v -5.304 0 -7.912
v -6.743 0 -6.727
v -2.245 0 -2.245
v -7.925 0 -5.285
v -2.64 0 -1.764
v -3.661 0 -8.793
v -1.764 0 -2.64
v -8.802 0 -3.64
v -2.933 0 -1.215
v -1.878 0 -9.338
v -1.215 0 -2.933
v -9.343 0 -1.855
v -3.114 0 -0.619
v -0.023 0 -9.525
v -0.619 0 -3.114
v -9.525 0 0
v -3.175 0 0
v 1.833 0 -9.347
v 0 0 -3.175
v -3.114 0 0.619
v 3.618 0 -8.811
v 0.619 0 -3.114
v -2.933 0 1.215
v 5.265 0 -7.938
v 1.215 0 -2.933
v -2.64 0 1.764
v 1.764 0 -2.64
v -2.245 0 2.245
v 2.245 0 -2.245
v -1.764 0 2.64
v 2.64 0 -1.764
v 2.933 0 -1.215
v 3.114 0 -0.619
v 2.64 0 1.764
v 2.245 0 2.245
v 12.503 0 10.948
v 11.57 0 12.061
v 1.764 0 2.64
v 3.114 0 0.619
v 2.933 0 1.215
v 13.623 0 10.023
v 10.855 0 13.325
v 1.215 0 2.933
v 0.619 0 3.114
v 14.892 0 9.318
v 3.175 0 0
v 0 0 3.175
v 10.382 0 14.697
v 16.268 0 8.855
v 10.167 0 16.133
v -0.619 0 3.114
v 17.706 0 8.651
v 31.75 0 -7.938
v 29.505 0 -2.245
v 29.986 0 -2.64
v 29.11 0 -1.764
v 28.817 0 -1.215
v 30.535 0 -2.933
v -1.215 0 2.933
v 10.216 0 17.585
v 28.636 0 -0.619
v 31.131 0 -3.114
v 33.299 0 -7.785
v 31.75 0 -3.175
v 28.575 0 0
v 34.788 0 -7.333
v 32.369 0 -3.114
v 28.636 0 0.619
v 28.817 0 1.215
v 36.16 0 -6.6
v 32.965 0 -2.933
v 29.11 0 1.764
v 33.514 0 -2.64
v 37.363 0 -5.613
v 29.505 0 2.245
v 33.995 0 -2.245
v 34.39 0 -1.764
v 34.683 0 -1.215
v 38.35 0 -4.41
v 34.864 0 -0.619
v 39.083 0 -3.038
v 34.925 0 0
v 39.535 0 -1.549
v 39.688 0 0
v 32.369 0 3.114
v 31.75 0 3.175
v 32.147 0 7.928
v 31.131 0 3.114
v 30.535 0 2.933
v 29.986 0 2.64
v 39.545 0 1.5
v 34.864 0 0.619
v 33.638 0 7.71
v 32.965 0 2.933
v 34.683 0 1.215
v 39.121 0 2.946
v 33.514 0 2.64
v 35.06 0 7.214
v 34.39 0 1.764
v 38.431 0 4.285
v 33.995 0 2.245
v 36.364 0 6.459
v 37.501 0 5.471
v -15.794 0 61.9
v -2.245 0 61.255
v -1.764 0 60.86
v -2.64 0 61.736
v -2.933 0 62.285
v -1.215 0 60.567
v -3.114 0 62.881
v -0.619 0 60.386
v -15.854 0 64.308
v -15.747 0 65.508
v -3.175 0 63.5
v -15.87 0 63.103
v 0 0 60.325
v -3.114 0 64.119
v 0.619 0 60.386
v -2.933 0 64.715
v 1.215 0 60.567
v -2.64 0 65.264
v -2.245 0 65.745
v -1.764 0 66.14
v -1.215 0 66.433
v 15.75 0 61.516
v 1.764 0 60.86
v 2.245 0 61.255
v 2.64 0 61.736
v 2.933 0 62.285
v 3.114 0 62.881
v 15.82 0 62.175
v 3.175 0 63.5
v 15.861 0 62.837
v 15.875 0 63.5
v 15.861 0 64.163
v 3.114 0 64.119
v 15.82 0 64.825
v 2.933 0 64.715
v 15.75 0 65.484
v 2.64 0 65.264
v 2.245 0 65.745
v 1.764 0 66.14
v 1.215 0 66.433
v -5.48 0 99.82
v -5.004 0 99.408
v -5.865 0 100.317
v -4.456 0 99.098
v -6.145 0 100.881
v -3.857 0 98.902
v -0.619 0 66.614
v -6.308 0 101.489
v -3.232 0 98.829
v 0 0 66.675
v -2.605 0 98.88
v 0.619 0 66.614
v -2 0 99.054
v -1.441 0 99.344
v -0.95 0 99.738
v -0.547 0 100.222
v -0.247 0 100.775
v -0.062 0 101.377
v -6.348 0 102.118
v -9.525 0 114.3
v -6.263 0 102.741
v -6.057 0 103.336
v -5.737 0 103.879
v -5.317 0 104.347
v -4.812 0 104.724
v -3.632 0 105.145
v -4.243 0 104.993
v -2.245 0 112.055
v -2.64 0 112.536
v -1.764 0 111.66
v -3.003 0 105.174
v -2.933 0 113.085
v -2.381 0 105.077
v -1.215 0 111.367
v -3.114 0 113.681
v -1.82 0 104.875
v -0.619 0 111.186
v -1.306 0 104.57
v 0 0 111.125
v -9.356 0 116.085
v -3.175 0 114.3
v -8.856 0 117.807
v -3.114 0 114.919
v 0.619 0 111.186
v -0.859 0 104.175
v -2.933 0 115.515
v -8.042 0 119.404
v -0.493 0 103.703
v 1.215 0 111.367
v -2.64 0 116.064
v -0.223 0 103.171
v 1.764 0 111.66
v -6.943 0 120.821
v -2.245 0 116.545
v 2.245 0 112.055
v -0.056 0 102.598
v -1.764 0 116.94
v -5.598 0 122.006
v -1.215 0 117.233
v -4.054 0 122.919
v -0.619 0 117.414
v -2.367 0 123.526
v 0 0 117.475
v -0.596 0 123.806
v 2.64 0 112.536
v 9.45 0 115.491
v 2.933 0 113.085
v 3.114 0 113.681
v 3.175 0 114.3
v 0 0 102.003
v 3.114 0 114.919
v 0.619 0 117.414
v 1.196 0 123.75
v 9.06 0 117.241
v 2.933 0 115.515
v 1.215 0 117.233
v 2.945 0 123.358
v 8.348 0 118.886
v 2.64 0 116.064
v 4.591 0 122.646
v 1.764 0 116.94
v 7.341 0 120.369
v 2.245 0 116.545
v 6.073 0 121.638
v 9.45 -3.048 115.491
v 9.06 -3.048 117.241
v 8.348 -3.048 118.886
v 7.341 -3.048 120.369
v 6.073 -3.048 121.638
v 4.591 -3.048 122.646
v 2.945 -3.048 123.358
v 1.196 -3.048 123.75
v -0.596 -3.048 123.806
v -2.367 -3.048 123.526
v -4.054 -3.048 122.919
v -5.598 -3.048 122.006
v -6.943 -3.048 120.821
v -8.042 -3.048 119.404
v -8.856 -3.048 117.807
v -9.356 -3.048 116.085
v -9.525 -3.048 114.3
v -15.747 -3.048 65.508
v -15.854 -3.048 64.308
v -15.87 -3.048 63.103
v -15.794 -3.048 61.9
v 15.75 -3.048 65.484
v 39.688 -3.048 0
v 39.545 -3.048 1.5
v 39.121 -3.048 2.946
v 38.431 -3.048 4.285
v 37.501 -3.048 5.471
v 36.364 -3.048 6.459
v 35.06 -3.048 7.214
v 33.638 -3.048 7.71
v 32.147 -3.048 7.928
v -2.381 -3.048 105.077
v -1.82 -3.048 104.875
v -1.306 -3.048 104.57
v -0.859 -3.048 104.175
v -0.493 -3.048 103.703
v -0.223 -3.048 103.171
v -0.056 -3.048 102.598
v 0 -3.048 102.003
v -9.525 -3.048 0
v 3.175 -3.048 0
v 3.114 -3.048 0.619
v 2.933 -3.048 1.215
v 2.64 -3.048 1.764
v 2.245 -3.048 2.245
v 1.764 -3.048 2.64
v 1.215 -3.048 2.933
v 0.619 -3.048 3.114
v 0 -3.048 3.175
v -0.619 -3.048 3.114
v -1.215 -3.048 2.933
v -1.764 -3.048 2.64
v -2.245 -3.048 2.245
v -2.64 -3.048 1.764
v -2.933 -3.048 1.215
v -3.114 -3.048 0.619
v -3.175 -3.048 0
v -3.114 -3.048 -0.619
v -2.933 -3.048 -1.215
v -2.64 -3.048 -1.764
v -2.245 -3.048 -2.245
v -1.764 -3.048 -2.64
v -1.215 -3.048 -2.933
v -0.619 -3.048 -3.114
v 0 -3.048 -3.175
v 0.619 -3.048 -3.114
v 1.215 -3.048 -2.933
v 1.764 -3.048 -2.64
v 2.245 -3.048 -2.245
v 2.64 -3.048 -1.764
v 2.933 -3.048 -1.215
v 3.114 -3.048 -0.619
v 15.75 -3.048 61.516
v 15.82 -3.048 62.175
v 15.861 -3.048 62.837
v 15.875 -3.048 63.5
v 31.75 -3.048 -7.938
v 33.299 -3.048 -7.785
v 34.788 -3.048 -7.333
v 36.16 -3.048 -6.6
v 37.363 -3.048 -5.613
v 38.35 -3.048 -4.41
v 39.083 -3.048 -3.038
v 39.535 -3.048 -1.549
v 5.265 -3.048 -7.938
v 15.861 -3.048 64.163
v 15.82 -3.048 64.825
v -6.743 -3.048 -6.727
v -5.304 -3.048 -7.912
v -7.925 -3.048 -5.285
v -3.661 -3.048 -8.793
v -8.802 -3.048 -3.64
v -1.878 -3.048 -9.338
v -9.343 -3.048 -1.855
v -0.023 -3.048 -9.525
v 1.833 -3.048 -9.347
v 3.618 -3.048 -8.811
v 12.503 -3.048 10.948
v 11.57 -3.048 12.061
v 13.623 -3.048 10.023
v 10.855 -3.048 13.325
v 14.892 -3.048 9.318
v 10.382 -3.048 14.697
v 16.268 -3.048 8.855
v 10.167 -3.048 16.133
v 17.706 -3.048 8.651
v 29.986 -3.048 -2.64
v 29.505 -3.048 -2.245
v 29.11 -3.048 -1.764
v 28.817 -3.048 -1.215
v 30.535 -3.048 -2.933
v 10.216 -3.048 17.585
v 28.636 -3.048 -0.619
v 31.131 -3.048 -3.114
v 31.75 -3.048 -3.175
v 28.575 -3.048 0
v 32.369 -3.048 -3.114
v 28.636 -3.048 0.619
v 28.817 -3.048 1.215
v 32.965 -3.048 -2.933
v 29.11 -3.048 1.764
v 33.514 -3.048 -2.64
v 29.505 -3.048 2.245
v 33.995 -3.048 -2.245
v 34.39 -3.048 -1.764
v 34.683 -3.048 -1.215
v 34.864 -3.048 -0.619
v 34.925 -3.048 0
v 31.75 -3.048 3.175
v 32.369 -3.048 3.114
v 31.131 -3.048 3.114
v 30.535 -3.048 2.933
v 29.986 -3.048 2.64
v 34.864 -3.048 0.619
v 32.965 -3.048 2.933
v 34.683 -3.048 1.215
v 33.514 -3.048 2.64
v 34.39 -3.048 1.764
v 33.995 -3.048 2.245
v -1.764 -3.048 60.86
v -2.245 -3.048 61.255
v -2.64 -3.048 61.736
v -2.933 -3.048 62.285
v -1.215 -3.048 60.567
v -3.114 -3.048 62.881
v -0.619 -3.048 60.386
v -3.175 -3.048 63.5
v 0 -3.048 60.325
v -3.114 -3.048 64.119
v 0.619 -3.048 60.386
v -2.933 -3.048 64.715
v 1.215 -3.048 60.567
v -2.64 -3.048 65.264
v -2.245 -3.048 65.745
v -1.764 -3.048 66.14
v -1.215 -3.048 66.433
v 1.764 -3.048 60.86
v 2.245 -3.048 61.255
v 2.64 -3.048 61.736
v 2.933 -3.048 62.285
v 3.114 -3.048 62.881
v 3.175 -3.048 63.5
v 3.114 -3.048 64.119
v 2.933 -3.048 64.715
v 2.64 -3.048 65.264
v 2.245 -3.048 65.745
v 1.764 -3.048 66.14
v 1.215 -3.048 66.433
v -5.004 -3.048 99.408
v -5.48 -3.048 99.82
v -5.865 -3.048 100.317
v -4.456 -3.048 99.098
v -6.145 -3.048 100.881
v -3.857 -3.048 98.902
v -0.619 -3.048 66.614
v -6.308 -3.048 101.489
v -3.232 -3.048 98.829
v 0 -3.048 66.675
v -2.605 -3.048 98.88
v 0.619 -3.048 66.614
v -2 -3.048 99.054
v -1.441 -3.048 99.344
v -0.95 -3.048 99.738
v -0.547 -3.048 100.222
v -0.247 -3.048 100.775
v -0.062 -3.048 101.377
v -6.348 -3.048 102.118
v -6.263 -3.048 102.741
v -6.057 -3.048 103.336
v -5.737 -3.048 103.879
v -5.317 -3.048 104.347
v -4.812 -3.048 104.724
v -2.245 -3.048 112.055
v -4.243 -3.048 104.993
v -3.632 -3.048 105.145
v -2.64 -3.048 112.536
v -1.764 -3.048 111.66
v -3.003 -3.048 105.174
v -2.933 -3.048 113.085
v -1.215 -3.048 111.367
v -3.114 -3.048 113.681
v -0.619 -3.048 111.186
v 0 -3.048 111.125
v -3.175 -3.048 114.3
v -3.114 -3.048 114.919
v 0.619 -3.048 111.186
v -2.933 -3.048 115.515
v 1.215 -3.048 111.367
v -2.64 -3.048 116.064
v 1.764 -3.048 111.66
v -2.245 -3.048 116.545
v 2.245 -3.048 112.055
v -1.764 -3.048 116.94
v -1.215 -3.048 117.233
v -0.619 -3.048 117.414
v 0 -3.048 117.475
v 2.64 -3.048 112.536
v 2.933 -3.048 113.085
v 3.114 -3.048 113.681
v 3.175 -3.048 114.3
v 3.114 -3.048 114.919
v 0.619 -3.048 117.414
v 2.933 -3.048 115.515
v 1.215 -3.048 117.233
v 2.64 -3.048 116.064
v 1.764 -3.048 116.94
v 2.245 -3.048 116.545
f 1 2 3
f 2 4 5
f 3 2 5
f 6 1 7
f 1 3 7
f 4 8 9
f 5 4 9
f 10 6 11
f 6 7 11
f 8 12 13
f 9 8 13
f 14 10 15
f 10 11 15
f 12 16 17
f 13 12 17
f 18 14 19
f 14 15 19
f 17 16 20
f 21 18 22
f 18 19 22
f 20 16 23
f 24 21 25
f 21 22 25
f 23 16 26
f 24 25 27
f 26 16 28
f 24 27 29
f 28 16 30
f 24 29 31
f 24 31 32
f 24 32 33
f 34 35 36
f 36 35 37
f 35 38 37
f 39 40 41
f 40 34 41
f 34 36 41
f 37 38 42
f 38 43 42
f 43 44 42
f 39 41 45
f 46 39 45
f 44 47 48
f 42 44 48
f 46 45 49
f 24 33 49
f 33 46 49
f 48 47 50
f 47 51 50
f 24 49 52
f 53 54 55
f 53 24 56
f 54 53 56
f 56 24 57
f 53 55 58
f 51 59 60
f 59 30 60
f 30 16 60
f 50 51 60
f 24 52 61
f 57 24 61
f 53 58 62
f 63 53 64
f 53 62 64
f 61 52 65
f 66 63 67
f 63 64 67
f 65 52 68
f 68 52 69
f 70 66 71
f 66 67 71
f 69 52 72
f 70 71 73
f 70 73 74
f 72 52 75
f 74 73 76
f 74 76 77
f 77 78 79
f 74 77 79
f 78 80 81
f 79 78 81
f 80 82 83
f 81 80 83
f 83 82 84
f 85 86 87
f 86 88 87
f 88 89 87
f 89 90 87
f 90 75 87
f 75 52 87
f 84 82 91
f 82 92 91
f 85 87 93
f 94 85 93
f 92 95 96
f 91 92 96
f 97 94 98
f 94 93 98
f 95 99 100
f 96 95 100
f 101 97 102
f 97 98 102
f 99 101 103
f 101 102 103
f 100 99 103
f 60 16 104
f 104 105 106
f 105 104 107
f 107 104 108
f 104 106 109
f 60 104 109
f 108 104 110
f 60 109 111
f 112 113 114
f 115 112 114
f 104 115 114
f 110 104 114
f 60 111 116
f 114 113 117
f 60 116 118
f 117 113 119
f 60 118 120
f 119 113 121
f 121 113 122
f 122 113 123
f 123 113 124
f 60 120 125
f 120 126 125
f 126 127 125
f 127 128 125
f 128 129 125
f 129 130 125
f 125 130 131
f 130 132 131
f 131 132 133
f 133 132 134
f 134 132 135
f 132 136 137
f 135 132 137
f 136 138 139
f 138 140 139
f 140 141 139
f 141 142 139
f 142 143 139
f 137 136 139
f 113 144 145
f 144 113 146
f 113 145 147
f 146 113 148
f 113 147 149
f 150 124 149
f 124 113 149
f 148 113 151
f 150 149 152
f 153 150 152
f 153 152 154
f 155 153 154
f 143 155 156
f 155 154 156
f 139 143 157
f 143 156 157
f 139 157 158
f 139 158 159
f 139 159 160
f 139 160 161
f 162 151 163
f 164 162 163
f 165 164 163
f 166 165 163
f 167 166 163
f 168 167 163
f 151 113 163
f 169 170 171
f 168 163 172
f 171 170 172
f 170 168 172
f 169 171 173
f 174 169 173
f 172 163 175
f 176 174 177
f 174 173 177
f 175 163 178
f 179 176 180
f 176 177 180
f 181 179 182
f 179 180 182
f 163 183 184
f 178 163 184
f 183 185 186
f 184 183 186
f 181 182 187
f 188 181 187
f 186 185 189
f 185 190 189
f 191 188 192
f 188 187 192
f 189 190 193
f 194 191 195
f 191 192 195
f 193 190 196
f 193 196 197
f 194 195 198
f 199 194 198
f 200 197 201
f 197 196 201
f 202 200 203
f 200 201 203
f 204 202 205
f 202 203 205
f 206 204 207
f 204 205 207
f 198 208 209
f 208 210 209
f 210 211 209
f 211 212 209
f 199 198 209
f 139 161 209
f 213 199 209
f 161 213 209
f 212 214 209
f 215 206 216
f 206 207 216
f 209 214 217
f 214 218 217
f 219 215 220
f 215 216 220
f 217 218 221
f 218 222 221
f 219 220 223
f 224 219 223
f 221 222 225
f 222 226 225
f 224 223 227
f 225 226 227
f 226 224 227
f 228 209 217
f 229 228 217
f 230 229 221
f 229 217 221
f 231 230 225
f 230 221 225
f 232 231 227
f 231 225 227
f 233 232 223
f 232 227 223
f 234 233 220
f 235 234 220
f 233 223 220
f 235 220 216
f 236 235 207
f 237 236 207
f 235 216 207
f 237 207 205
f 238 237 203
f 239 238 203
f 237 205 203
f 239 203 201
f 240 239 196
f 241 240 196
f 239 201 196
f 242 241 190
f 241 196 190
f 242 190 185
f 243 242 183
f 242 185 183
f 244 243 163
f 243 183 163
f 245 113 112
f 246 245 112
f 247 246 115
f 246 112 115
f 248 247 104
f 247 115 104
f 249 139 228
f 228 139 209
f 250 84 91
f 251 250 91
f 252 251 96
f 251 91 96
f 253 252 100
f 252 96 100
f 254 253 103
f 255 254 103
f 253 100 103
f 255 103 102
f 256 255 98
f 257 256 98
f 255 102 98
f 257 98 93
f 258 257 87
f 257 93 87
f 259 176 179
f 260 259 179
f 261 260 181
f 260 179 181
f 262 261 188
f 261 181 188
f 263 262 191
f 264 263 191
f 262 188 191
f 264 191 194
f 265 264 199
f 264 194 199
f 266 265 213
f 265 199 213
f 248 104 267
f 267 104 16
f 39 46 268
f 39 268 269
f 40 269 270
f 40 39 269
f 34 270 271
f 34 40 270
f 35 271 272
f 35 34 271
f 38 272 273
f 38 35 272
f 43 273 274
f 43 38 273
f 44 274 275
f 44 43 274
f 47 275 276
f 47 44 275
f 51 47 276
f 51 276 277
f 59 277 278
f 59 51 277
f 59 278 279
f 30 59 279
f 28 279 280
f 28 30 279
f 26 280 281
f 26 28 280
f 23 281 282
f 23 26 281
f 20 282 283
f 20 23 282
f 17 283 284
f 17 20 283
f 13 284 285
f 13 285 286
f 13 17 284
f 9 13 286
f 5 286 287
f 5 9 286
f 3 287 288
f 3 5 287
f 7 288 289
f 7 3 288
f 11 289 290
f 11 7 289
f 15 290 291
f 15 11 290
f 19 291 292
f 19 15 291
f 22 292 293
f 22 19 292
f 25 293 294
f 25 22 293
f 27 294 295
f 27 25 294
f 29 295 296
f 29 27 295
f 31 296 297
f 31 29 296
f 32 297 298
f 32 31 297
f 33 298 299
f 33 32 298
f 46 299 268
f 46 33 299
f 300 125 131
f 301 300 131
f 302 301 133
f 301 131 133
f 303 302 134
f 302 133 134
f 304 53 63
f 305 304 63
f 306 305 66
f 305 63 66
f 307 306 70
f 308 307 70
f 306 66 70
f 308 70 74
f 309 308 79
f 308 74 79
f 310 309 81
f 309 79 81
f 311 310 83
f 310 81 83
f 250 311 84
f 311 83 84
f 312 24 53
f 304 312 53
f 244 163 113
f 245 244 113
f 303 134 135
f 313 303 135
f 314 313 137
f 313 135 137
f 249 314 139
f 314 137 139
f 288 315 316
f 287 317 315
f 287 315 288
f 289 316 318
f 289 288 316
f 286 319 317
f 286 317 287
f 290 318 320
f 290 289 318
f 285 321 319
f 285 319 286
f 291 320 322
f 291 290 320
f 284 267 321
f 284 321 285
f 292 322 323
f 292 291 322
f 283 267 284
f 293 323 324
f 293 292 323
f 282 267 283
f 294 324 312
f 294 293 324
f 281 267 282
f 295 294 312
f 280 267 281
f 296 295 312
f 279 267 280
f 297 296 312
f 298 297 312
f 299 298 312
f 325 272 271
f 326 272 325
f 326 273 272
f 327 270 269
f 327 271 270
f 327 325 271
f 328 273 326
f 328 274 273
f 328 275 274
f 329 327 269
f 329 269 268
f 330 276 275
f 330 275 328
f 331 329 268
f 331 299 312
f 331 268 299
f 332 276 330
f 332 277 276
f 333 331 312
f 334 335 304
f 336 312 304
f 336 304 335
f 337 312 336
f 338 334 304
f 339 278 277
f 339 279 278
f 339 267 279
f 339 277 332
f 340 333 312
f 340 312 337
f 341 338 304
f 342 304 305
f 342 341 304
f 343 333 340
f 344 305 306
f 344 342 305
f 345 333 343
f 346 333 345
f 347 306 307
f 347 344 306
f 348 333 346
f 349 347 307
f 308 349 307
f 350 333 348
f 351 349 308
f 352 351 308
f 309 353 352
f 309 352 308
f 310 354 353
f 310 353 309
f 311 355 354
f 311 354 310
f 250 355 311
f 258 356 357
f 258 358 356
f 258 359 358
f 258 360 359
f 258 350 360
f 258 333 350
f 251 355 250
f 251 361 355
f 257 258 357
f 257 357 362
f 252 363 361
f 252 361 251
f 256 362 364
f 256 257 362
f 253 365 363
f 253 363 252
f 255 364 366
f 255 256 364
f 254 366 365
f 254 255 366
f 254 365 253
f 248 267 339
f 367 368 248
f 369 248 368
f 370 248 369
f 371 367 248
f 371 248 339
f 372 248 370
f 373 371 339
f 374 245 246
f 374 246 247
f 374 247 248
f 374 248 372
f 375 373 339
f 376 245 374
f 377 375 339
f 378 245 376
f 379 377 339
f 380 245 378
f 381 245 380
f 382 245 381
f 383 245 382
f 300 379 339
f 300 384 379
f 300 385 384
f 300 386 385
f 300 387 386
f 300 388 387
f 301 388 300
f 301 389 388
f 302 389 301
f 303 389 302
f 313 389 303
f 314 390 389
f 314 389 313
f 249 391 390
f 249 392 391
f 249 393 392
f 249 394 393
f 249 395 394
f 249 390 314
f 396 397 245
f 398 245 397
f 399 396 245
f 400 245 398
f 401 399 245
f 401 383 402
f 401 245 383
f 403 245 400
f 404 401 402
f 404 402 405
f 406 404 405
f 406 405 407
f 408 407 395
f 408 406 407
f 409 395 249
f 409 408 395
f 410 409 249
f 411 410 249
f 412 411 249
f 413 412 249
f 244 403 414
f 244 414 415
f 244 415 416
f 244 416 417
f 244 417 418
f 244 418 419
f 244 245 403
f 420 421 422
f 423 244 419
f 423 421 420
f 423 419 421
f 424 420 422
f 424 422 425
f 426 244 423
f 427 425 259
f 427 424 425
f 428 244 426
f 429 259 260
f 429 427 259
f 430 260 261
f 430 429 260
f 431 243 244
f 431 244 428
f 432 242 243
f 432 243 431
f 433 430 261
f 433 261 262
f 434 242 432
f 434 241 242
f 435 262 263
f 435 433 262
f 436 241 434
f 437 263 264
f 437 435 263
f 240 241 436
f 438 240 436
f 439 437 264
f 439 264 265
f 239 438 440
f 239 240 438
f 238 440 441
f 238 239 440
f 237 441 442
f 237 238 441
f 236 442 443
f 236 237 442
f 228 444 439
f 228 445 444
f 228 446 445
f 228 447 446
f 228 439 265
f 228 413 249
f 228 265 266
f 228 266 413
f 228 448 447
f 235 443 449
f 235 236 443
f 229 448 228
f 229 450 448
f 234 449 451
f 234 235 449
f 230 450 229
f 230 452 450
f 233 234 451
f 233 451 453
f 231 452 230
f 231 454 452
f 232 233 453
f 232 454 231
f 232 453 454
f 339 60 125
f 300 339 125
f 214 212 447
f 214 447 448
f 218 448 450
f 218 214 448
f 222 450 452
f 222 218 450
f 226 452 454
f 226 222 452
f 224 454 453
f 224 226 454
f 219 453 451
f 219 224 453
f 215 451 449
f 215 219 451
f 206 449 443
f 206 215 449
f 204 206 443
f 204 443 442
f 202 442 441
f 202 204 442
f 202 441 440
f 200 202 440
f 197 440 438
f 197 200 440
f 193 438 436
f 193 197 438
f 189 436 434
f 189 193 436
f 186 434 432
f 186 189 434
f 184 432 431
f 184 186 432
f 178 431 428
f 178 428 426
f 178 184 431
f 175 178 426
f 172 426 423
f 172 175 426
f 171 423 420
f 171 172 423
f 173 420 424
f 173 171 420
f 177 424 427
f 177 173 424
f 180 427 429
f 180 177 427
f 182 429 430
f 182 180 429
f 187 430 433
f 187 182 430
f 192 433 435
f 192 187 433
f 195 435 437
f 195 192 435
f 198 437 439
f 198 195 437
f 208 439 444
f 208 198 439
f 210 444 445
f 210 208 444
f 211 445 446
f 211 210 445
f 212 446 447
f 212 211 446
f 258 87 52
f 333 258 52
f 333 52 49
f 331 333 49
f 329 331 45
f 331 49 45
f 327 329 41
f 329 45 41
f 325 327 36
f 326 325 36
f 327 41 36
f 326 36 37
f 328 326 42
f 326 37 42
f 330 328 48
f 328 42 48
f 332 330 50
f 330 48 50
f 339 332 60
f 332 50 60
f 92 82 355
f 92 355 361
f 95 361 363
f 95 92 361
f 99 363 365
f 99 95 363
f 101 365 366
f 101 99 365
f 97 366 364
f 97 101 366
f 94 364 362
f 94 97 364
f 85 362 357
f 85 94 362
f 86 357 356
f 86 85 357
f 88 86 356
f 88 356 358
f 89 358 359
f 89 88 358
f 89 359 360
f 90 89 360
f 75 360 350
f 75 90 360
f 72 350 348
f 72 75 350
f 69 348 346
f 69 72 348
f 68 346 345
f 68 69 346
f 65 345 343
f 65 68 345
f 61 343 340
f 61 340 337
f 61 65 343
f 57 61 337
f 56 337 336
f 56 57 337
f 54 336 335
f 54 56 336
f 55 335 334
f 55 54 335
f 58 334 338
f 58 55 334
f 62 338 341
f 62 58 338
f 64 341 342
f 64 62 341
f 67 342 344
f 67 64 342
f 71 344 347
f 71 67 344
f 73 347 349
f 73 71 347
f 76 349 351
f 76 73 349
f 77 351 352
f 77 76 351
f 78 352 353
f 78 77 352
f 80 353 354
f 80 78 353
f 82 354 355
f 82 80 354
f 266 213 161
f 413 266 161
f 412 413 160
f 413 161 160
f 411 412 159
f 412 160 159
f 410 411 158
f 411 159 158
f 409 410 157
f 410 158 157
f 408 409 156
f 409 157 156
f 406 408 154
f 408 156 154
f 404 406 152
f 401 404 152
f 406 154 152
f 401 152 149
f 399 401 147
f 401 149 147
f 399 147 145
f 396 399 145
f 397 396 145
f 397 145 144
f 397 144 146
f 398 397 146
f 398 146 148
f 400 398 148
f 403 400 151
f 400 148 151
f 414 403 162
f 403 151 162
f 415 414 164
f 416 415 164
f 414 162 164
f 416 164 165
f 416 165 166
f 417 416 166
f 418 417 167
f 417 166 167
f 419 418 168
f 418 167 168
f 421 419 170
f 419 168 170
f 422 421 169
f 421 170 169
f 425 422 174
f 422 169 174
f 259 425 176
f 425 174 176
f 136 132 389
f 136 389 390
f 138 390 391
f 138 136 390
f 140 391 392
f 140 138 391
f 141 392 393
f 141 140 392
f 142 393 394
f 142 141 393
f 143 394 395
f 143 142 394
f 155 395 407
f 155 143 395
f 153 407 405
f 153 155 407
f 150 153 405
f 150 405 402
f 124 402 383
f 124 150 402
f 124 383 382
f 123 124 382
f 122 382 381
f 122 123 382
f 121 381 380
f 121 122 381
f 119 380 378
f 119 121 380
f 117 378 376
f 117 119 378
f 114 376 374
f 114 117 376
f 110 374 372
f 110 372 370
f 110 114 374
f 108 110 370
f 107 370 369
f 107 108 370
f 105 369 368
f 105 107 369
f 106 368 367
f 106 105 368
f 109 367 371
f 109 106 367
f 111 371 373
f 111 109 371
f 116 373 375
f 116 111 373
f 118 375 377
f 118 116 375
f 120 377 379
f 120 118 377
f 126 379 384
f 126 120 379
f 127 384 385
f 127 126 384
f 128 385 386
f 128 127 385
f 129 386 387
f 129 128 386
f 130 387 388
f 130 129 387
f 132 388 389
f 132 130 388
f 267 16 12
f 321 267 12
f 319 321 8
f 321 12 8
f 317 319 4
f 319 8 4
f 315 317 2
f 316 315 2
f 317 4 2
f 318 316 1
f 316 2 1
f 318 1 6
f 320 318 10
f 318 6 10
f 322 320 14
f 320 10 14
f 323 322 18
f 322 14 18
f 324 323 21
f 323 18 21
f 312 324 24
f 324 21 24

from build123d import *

# Parameters (mm, degrees)
F0_R     = 3.175
F1_DEPTH = 3.048


with BuildPart() as f1:
    # F0 (on Front) → F1 (new body)
    with BuildSketch(Plane.XZ):
        with BuildLine():
            ThreePointArc((-2.38125, 105.077459), (5.832847, 106.769826), (9.525, 114.3))
            ThreePointArc((9.525, 114.3), (9.506305, 114.896483), (9.450293, 115.490625))
            ThreePointArc((9.450293, 115.490625), (-0.596483, 123.806305), (-9.525, 114.3))
            ThreePointArc((-9.525, 114.3), (-7.530174, 108.467153), (-2.38125, 105.077459))
        make_face()
        with Locations((0, 114.3)):
            Circle(F0_R, mode=Mode.SUBTRACT)
        with BuildLine():
            ThreePointArc((9.450293, 115.490625), (9.506305, 114.896483), (9.525, 114.3))
            ThreePointArc((9.525, 114.3), (5.832847, 106.769826), (-2.38125, 105.077459))
            ThreePointArc((-2.38125, 105.077459), (-7.530174, 108.467153), (-9.525, 114.3))
            Line((-9.525, 114.3), (-15.747457, 65.508289))
            ThreePointArc((-15.747457, 65.508289), (0.012053, 79.374995), (15.750488, 65.484375))
            Line((15.750488, 65.484375), (9.450293, 115.490625))
        make_face()
        with BuildLine():
            ThreePointArc((0, 102.003278), (-5.685058, 100.058995), (-2.38125, 105.077459))
            ThreePointArc((-2.38125, 105.077459), (-0.664942, 103.947561), (0, 102.003278))
        make_face(mode=Mode.SUBTRACT)
        with BuildLine():
            ThreePointArc((15.875, 63.5), (15.843841, 64.494139), (15.750488, 65.484375))
            ThreePointArc((15.750488, 65.484375), (0.012053, 79.374995), (-15.747457, 65.508289))
            ThreePointArc((-15.747457, 65.508289), (-15.873668, 63.705667), (-15.794203, 61.90038))
            ThreePointArc((-15.794203, 61.90038), (-0.193615, 47.626181), (15.750488, 61.515625))
            ThreePointArc((15.750488, 61.515625), (15.843841, 62.505861), (15.875, 63.5))
        make_face()
        with Locations((0, 63.5)):
            Circle(F0_R, mode=Mode.SUBTRACT)
        with BuildLine():
            ThreePointArc((15.750488, 61.515625), (-0.193615, 47.626181), (-15.794203, 61.90038))
            Line((-15.794203, 61.90038), (-9.525, 0))
            ThreePointArc((-9.525, 0), (0, 9.525), (9.525, 0))
            ThreePointArc((9.525, 0), (8.392738, -4.504173), (5.265142, -7.9375))
            Line((5.265142, -7.9375), (31.75, -7.9375))
            ThreePointArc((31.75, -7.9375), (23.814982, 0.1985), (32.146875, 7.927572))
            Line((32.146875, 7.927572), (17.706028, 8.650519))
            ThreePointArc((17.706028, 8.650519), (12.011247, 11.482969), (10.215693, 17.58455))
            Line((10.215693, 17.58455), (15.750488, 61.515625))
        make_face()
        with BuildLine():
            ThreePointArc((9.525, 0), (0, 9.525), (-9.525, 0))
            ThreePointArc((-9.525, 0), (-4.504173, -8.392738), (5.265142, -7.9375))
            ThreePointArc((5.265142, -7.9375), (8.392738, -4.504173), (9.525, 0))
        make_face()
        Circle(F0_R, mode=Mode.SUBTRACT)
        with BuildLine():
            ThreePointArc((32.146875, 7.927572), (23.814982, 0.1985), (31.75, -7.9375))
            ThreePointArc((31.75, -7.9375), (37.36266, -5.61266), (39.6875, 0))
            ThreePointArc((39.6875, 0), (37.501265, 5.470544), (32.146875, 7.927572))
        make_face()
        with Locations((31.75, 0)):
            Circle(F0_R, mode=Mode.SUBTRACT)
    extrude(amount=F1_DEPTH)


solid = f1.part
